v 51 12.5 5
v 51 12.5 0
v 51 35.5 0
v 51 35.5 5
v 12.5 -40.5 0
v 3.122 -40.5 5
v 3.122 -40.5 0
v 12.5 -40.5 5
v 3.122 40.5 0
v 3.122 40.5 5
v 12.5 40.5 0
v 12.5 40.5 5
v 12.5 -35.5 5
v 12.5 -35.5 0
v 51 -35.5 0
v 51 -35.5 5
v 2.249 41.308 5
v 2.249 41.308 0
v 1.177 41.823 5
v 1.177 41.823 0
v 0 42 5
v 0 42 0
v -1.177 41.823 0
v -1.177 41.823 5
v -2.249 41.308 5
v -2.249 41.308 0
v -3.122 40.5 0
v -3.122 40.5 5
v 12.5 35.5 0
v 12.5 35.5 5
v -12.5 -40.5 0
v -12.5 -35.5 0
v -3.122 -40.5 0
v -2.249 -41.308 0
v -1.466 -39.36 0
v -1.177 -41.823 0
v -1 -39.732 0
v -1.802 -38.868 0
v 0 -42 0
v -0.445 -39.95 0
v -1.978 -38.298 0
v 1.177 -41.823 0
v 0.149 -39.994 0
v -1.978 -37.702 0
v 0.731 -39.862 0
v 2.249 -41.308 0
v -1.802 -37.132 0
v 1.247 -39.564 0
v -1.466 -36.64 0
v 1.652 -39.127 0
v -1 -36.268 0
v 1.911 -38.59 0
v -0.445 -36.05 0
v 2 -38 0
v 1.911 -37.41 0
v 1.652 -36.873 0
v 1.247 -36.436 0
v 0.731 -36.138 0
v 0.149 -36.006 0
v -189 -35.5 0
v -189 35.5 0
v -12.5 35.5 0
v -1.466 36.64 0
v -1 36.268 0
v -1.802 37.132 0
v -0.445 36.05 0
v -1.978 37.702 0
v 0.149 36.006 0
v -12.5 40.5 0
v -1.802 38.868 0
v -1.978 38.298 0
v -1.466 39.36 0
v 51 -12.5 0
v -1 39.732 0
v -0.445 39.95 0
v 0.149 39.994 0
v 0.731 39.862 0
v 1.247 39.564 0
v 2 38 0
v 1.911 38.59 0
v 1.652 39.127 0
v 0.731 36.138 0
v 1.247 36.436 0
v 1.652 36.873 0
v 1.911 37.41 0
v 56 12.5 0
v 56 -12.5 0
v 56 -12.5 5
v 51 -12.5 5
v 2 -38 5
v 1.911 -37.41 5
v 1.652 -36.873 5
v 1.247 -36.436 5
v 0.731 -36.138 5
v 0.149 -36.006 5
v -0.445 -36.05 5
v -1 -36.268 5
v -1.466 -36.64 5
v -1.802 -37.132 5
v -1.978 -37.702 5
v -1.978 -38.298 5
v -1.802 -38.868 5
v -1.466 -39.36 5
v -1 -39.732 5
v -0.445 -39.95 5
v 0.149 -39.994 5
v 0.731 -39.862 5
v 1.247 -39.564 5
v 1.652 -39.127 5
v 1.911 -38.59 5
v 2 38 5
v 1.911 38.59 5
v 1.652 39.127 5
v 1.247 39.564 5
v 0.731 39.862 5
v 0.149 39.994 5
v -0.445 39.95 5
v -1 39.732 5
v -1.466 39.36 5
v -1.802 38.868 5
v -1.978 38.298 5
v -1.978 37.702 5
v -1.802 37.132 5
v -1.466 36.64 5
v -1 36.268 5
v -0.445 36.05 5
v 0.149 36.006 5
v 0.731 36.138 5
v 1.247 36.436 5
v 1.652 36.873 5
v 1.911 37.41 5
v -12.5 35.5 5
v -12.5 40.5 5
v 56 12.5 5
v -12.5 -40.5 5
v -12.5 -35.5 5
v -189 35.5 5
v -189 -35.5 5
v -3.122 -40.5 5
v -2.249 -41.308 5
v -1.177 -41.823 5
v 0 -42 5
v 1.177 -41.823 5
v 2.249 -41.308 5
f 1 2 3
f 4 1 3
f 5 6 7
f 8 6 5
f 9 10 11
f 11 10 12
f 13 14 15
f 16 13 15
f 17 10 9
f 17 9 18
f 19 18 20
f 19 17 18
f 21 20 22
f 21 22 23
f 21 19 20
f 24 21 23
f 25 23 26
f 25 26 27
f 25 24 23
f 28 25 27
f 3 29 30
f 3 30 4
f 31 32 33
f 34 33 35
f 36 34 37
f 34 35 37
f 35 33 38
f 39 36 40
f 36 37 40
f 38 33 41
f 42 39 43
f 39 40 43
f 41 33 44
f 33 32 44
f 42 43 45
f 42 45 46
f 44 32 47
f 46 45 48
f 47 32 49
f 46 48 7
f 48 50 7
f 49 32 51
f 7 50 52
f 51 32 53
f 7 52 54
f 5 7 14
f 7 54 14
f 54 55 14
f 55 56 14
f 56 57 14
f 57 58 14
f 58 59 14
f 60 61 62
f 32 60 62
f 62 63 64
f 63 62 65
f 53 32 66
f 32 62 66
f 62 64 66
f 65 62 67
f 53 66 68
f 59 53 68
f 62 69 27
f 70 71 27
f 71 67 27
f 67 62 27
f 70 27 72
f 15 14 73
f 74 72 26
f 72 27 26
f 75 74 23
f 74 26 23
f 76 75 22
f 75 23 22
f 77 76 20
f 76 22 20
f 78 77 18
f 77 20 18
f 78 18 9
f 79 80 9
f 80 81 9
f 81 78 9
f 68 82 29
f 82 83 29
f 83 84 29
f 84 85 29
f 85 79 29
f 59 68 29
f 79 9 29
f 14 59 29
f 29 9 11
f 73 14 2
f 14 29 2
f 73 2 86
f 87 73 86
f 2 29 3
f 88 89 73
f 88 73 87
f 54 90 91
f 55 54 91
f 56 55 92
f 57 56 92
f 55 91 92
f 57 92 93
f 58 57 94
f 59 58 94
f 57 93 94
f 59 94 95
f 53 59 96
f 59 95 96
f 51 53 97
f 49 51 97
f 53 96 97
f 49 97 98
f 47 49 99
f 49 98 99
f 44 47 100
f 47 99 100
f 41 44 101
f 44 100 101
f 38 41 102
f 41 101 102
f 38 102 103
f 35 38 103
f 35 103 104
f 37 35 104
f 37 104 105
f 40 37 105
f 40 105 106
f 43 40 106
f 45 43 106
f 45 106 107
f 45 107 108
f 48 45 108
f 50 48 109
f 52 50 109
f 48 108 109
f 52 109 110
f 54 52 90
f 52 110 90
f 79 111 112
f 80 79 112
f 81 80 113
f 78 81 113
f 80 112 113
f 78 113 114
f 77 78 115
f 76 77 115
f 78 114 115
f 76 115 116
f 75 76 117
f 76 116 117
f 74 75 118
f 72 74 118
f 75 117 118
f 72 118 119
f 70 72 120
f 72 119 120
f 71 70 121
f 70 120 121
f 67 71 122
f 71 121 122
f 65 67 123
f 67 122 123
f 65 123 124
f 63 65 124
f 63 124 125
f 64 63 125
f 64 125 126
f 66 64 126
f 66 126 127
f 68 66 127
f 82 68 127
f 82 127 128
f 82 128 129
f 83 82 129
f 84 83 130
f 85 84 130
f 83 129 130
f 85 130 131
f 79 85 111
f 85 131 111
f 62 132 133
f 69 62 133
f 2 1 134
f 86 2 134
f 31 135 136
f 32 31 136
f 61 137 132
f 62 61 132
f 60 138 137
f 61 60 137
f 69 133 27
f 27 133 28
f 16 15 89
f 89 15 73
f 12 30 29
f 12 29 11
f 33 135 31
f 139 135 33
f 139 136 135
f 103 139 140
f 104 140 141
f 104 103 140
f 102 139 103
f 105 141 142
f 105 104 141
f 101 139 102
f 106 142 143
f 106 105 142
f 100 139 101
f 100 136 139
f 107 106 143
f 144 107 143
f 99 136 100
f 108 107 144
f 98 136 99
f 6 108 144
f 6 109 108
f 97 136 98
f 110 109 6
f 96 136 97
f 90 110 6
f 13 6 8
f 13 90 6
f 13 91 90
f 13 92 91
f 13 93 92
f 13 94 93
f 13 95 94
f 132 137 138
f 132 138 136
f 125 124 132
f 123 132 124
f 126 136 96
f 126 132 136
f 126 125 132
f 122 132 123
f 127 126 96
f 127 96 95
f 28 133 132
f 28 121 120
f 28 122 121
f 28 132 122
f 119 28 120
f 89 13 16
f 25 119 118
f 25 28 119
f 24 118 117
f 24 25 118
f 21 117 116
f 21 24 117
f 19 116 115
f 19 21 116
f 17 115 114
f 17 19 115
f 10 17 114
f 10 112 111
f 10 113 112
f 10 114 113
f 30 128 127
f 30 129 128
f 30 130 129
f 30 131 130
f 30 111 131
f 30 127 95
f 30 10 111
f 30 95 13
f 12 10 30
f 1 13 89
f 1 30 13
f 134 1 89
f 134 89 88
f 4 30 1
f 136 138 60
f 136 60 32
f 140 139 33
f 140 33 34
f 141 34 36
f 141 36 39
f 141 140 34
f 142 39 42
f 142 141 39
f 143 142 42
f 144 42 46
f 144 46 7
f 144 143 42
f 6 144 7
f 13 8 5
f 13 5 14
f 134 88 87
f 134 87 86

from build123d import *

# Parameters (mm, degrees)
SKETCH1_W           = 102
SKETCH1_H           = 71
BOSS_EXTRUDE1_DEPTH = 5
SKETCH3_W           = 25
SKETCH3_H           = 5
SKETCH3_W_2         = 5
SKETCH3_H_2         = 25
BOSS_EXTRUDE2_DEPTH = 5
SKETCH4_R           = 2
CUT_EXTRUDE1_DEPTH  = 5
SKETCH5_R           = 4
SKETCH5_R_2         = 2
BOSS_EXTRUDE3_DEPTH = 5
SKETCH6_W           = 138
SKETCH6_H           = 71
BOSS_EXTRUDE4_DEPTH = 5


with BuildPart() as part:
    # Sketch1 → Boss-Extrude1 (new body)
    with BuildSketch(Plane.XY):
        Rectangle(SKETCH1_W, SKETCH1_H)
    extrude(amount=BOSS_EXTRUDE1_DEPTH)

    # Sketch3 → Boss-Extrude2 (add)
    with BuildSketch(Plane.XY.offset(5)):
        with Locations((0, 38)):
            Rectangle(SKETCH3_W, SKETCH3_H)
        with Locations((53.5, 0)):
            Rectangle(SKETCH3_W_2, SKETCH3_H_2)
        with Locations((0, -38)):
            Rectangle(SKETCH3_W, SKETCH3_H)
    extrude(amount=-BOSS_EXTRUDE2_DEPTH)

    # Sketch4 → Cut-Extrude1 (cut)
    with BuildSketch(Plane.XY.offset(5)):
        with Locations((0, 38)):
            Circle(SKETCH4_R)
        with Locations((0, -38)):
            Circle(SKETCH4_R)
    extrude(amount=-CUT_EXTRUDE1_DEPTH, mode=Mode.SUBTRACT)

    # Sketch5 → Boss-Extrude3 (add)
    # profile 1 of 2: a face of its own
    with BuildSketch(Plane.XY.offset(5)):
        with Locations((0, 38)):
            Circle(SKETCH5_R)
        with Locations((0, 38)):
            Circle(SKETCH5_R_2, mode=Mode.SUBTRACT)
    # profile 2 of 2: a face of its own
    with BuildSketch(Plane.XY.offset(5)):
        with Locations((0, -38)):
            Circle(SKETCH5_R)
        with Locations((0, -38)):
            Circle(SKETCH5_R_2, mode=Mode.SUBTRACT)
    extrude(amount=-BOSS_EXTRUDE3_DEPTH)

    # Sketch6 → Boss-Extrude4 (add)
    with BuildSketch(Plane.XY.offset(5)):
        with Locations((-120, 0)):
            Rectangle(SKETCH6_W, SKETCH6_H)
    extrude(amount=-BOSS_EXTRUDE4_DEPTH)


solid = part.part
